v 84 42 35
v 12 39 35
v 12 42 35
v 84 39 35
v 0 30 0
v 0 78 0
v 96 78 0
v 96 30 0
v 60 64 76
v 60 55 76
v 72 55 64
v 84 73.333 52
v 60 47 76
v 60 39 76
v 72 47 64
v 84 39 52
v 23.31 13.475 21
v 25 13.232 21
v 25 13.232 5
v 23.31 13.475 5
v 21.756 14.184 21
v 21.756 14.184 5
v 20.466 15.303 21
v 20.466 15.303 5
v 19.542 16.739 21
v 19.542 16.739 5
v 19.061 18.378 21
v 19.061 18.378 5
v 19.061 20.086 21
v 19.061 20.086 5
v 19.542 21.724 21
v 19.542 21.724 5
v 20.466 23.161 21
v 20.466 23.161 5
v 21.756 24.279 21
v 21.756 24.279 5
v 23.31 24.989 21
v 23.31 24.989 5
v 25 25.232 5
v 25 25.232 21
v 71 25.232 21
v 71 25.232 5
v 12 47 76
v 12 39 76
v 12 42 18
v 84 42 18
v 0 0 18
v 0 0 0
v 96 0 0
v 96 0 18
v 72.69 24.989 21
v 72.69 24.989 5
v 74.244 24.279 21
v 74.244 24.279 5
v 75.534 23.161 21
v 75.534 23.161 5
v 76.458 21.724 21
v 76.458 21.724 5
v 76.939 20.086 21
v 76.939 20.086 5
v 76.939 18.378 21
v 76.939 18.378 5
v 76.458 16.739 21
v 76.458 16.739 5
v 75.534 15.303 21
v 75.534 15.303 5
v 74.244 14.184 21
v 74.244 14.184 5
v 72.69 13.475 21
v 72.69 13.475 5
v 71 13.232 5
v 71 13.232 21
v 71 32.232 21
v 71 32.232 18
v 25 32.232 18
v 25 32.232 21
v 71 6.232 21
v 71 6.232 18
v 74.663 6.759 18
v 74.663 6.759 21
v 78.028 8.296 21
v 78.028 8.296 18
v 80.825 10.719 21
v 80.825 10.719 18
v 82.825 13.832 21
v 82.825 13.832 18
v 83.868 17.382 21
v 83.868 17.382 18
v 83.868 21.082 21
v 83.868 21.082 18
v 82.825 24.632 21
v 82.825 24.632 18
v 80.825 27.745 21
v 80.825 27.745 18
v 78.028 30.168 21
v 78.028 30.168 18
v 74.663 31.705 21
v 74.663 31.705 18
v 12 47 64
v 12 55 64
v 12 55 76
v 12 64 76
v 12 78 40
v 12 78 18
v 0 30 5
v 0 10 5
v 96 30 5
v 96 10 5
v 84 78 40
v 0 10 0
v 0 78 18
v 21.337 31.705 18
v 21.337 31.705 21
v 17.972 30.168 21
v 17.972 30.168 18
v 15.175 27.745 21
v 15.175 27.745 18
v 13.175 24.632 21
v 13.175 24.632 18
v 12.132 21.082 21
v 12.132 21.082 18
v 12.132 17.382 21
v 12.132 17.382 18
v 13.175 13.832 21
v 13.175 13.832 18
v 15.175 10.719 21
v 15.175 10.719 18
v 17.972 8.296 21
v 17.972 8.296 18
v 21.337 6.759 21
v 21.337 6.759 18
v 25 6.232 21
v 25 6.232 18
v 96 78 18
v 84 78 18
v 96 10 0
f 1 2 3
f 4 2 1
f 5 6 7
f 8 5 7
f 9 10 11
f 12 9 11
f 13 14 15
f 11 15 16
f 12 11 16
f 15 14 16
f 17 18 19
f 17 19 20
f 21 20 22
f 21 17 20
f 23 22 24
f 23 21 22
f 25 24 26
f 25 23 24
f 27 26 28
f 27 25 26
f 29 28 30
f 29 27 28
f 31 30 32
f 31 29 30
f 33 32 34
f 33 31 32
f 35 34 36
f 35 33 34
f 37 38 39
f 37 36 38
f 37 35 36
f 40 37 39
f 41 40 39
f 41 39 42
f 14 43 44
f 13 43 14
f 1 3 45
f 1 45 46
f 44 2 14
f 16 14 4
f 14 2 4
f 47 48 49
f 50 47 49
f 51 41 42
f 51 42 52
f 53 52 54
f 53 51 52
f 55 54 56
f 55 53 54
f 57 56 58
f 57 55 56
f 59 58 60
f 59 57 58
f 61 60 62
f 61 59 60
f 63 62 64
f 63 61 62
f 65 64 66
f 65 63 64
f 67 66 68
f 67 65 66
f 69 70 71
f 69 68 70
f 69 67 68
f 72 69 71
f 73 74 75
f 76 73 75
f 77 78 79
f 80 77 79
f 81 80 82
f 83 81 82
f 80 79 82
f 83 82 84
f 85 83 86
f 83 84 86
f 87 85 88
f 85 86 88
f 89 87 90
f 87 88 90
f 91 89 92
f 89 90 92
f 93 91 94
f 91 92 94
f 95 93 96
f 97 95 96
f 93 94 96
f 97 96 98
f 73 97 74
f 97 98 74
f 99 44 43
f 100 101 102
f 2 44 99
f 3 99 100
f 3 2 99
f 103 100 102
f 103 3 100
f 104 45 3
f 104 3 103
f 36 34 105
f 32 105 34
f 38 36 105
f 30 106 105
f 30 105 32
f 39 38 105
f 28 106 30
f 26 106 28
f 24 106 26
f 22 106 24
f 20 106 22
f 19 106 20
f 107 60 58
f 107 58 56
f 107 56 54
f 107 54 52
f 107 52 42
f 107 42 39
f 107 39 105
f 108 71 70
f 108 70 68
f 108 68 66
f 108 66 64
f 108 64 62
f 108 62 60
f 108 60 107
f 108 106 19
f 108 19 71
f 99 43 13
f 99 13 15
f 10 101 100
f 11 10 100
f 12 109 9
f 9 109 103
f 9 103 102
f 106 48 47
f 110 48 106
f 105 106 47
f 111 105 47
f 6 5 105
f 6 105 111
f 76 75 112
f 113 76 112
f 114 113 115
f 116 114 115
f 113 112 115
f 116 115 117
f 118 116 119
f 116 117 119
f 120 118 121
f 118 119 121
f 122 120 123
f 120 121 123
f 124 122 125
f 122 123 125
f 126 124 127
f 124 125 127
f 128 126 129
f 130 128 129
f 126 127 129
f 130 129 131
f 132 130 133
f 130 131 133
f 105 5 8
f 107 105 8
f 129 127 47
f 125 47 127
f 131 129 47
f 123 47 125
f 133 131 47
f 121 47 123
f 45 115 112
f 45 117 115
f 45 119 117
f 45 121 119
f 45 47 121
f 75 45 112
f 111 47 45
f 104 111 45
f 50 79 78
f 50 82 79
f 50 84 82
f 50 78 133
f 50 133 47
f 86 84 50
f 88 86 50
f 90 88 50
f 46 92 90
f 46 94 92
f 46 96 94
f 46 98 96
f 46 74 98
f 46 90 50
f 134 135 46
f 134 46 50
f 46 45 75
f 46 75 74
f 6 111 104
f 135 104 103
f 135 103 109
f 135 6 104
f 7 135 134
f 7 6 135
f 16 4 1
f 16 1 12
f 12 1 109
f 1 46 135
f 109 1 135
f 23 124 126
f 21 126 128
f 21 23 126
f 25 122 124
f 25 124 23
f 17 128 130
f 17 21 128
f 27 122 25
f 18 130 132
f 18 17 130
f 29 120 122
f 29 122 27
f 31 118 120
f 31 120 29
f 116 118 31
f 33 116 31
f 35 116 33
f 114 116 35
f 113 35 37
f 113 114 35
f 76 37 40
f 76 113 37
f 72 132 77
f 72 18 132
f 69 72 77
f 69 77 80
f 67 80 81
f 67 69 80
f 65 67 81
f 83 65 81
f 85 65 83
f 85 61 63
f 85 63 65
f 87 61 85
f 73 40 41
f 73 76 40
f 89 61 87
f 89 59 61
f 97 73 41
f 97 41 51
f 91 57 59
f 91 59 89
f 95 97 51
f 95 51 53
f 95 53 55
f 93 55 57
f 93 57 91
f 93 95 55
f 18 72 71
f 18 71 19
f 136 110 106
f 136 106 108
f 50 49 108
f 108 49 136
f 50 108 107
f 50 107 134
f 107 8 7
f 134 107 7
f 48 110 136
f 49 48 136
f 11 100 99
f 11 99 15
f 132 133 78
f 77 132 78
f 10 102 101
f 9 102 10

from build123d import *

# Parameters (mm, degrees)
F0_W      = 96
F0_H      = 78
F1_DEPTH  = 18
F2_W      = 72
F2_H      = 39
F3_DEPTH  = 58
F4_W      = 72
F4_H      = 8
F5_DEPTH  = 12
F6_W      = 96
F6_H      = 20
F7_DEPTH  = 5
F10_DEPTH = 39.001
F12_DEPTH = 3
F13_DEPTH = 18.001
F15_DEPTH = 84.001
F16_W     = 72
F16_H     = 17
F17_DEPTH = 3


with BuildPart() as f1:
    # F0 (on Top) → F1 (new body)
    with BuildSketch(Plane.XY):
        with Locations((48, 39)):
            Rectangle(F0_W, F0_H)
    extrude(amount=F1_DEPTH)

    # F2 (on face) → F3 (join)
    with BuildSketch(Plane.XY.offset(18)):
        with Locations((48, 58.5)):
            Rectangle(F2_W, F2_H)
    extrude(amount=F3_DEPTH)

    # F4 (on face) → F5 (cut)
    with BuildSketch(Plane.XY.offset(76)):
        with Locations((48, 51)):
            Rectangle(F4_W, F4_H)
    extrude(amount=-F5_DEPTH, mode=Mode.SUBTRACT)

    # F6 (on face) → F7 (cut)
    with BuildSketch(Plane(origin=(0, 0, 0), x_dir=(1, 0, 0), z_dir=(0, 0, -1))):
        with Locations((48, -20)):
            Rectangle(F6_W, F6_H)
    extrude(amount=-F7_DEPTH, mode=Mode.SUBTRACT)

    # F9 (on face) + F8 (on face) → F10 (cut, through all)
    with BuildSketch(Plane.XZ.offset(-39)):
        Polygon((84, 76), (60, 76), (84, 52), align=None)
    with BuildSketch(Plane(origin=(0, 78, 0), x_dir=(-1, 0, 0), z_dir=(0, 1, 0))):
        Polygon((-84, 18), (-96, 18), (-96, 0), (0, 0), (0, 18), (-12, 18), (-12, 76), (-84, 76), align=None)
    extrude(amount=-F10_DEPTH, dir=(0, -1, 0), mode=Mode.SUBTRACT)

    # F11 (on face) → F12 (join)
    with BuildSketch(Plane.XY.offset(18)):
        with BuildLine():
            ThreePointArc((25, 32.231967628), (12, 19.231967628), (25, 6.231967628))
            Line((25, 6.231967628), (71, 6.231967628))
            ThreePointArc((71, 6.231967628), (84, 19.231967628), (71, 32.231967628))
            Line((71, 32.231967628), (25, 32.231967628))
        make_face()
        with BuildLine():
            Line((71, 13.231967628), (25, 13.231967628))
            ThreePointArc((25, 13.231967628), (19, 19.231967628), (25, 25.231967628))
            Line((25, 25.231967628), (71, 25.231967628))
            ThreePointArc((71, 25.231967628), (77, 19.231967628), (71, 13.231967628))
        make_face(mode=Mode.SUBTRACT)
    extrude(amount=F12_DEPTH)

    # F13 (cut, through all): a face of the model
    f13_faces = [f1.faces().sort_by_distance(p)[0] for p in [
        (48, 19.231967628, 18),
    ]]
    extrude(f13_faces, amount=-F13_DEPTH, mode=Mode.SUBTRACT)

    # F14 (on face) → F15 (cut, through all)
    with BuildSketch(Plane(origin=(12, 0, 0), x_dir=(0, -1, 0), z_dir=(-1, 0, 0))):
        Polygon((-64, 76), (-78, 76), (-78, 40), align=None)
    extrude(amount=-F15_DEPTH, mode=Mode.SUBTRACT)

    # F16 (on face) → F17 (cut)
    with BuildSketch(Plane.XZ.offset(-39)):
        with Locations((48, 26.5)):
            Rectangle(F16_W, F16_H)
    extrude(amount=-F17_DEPTH, mode=Mode.SUBTRACT)


solid = f1.part
